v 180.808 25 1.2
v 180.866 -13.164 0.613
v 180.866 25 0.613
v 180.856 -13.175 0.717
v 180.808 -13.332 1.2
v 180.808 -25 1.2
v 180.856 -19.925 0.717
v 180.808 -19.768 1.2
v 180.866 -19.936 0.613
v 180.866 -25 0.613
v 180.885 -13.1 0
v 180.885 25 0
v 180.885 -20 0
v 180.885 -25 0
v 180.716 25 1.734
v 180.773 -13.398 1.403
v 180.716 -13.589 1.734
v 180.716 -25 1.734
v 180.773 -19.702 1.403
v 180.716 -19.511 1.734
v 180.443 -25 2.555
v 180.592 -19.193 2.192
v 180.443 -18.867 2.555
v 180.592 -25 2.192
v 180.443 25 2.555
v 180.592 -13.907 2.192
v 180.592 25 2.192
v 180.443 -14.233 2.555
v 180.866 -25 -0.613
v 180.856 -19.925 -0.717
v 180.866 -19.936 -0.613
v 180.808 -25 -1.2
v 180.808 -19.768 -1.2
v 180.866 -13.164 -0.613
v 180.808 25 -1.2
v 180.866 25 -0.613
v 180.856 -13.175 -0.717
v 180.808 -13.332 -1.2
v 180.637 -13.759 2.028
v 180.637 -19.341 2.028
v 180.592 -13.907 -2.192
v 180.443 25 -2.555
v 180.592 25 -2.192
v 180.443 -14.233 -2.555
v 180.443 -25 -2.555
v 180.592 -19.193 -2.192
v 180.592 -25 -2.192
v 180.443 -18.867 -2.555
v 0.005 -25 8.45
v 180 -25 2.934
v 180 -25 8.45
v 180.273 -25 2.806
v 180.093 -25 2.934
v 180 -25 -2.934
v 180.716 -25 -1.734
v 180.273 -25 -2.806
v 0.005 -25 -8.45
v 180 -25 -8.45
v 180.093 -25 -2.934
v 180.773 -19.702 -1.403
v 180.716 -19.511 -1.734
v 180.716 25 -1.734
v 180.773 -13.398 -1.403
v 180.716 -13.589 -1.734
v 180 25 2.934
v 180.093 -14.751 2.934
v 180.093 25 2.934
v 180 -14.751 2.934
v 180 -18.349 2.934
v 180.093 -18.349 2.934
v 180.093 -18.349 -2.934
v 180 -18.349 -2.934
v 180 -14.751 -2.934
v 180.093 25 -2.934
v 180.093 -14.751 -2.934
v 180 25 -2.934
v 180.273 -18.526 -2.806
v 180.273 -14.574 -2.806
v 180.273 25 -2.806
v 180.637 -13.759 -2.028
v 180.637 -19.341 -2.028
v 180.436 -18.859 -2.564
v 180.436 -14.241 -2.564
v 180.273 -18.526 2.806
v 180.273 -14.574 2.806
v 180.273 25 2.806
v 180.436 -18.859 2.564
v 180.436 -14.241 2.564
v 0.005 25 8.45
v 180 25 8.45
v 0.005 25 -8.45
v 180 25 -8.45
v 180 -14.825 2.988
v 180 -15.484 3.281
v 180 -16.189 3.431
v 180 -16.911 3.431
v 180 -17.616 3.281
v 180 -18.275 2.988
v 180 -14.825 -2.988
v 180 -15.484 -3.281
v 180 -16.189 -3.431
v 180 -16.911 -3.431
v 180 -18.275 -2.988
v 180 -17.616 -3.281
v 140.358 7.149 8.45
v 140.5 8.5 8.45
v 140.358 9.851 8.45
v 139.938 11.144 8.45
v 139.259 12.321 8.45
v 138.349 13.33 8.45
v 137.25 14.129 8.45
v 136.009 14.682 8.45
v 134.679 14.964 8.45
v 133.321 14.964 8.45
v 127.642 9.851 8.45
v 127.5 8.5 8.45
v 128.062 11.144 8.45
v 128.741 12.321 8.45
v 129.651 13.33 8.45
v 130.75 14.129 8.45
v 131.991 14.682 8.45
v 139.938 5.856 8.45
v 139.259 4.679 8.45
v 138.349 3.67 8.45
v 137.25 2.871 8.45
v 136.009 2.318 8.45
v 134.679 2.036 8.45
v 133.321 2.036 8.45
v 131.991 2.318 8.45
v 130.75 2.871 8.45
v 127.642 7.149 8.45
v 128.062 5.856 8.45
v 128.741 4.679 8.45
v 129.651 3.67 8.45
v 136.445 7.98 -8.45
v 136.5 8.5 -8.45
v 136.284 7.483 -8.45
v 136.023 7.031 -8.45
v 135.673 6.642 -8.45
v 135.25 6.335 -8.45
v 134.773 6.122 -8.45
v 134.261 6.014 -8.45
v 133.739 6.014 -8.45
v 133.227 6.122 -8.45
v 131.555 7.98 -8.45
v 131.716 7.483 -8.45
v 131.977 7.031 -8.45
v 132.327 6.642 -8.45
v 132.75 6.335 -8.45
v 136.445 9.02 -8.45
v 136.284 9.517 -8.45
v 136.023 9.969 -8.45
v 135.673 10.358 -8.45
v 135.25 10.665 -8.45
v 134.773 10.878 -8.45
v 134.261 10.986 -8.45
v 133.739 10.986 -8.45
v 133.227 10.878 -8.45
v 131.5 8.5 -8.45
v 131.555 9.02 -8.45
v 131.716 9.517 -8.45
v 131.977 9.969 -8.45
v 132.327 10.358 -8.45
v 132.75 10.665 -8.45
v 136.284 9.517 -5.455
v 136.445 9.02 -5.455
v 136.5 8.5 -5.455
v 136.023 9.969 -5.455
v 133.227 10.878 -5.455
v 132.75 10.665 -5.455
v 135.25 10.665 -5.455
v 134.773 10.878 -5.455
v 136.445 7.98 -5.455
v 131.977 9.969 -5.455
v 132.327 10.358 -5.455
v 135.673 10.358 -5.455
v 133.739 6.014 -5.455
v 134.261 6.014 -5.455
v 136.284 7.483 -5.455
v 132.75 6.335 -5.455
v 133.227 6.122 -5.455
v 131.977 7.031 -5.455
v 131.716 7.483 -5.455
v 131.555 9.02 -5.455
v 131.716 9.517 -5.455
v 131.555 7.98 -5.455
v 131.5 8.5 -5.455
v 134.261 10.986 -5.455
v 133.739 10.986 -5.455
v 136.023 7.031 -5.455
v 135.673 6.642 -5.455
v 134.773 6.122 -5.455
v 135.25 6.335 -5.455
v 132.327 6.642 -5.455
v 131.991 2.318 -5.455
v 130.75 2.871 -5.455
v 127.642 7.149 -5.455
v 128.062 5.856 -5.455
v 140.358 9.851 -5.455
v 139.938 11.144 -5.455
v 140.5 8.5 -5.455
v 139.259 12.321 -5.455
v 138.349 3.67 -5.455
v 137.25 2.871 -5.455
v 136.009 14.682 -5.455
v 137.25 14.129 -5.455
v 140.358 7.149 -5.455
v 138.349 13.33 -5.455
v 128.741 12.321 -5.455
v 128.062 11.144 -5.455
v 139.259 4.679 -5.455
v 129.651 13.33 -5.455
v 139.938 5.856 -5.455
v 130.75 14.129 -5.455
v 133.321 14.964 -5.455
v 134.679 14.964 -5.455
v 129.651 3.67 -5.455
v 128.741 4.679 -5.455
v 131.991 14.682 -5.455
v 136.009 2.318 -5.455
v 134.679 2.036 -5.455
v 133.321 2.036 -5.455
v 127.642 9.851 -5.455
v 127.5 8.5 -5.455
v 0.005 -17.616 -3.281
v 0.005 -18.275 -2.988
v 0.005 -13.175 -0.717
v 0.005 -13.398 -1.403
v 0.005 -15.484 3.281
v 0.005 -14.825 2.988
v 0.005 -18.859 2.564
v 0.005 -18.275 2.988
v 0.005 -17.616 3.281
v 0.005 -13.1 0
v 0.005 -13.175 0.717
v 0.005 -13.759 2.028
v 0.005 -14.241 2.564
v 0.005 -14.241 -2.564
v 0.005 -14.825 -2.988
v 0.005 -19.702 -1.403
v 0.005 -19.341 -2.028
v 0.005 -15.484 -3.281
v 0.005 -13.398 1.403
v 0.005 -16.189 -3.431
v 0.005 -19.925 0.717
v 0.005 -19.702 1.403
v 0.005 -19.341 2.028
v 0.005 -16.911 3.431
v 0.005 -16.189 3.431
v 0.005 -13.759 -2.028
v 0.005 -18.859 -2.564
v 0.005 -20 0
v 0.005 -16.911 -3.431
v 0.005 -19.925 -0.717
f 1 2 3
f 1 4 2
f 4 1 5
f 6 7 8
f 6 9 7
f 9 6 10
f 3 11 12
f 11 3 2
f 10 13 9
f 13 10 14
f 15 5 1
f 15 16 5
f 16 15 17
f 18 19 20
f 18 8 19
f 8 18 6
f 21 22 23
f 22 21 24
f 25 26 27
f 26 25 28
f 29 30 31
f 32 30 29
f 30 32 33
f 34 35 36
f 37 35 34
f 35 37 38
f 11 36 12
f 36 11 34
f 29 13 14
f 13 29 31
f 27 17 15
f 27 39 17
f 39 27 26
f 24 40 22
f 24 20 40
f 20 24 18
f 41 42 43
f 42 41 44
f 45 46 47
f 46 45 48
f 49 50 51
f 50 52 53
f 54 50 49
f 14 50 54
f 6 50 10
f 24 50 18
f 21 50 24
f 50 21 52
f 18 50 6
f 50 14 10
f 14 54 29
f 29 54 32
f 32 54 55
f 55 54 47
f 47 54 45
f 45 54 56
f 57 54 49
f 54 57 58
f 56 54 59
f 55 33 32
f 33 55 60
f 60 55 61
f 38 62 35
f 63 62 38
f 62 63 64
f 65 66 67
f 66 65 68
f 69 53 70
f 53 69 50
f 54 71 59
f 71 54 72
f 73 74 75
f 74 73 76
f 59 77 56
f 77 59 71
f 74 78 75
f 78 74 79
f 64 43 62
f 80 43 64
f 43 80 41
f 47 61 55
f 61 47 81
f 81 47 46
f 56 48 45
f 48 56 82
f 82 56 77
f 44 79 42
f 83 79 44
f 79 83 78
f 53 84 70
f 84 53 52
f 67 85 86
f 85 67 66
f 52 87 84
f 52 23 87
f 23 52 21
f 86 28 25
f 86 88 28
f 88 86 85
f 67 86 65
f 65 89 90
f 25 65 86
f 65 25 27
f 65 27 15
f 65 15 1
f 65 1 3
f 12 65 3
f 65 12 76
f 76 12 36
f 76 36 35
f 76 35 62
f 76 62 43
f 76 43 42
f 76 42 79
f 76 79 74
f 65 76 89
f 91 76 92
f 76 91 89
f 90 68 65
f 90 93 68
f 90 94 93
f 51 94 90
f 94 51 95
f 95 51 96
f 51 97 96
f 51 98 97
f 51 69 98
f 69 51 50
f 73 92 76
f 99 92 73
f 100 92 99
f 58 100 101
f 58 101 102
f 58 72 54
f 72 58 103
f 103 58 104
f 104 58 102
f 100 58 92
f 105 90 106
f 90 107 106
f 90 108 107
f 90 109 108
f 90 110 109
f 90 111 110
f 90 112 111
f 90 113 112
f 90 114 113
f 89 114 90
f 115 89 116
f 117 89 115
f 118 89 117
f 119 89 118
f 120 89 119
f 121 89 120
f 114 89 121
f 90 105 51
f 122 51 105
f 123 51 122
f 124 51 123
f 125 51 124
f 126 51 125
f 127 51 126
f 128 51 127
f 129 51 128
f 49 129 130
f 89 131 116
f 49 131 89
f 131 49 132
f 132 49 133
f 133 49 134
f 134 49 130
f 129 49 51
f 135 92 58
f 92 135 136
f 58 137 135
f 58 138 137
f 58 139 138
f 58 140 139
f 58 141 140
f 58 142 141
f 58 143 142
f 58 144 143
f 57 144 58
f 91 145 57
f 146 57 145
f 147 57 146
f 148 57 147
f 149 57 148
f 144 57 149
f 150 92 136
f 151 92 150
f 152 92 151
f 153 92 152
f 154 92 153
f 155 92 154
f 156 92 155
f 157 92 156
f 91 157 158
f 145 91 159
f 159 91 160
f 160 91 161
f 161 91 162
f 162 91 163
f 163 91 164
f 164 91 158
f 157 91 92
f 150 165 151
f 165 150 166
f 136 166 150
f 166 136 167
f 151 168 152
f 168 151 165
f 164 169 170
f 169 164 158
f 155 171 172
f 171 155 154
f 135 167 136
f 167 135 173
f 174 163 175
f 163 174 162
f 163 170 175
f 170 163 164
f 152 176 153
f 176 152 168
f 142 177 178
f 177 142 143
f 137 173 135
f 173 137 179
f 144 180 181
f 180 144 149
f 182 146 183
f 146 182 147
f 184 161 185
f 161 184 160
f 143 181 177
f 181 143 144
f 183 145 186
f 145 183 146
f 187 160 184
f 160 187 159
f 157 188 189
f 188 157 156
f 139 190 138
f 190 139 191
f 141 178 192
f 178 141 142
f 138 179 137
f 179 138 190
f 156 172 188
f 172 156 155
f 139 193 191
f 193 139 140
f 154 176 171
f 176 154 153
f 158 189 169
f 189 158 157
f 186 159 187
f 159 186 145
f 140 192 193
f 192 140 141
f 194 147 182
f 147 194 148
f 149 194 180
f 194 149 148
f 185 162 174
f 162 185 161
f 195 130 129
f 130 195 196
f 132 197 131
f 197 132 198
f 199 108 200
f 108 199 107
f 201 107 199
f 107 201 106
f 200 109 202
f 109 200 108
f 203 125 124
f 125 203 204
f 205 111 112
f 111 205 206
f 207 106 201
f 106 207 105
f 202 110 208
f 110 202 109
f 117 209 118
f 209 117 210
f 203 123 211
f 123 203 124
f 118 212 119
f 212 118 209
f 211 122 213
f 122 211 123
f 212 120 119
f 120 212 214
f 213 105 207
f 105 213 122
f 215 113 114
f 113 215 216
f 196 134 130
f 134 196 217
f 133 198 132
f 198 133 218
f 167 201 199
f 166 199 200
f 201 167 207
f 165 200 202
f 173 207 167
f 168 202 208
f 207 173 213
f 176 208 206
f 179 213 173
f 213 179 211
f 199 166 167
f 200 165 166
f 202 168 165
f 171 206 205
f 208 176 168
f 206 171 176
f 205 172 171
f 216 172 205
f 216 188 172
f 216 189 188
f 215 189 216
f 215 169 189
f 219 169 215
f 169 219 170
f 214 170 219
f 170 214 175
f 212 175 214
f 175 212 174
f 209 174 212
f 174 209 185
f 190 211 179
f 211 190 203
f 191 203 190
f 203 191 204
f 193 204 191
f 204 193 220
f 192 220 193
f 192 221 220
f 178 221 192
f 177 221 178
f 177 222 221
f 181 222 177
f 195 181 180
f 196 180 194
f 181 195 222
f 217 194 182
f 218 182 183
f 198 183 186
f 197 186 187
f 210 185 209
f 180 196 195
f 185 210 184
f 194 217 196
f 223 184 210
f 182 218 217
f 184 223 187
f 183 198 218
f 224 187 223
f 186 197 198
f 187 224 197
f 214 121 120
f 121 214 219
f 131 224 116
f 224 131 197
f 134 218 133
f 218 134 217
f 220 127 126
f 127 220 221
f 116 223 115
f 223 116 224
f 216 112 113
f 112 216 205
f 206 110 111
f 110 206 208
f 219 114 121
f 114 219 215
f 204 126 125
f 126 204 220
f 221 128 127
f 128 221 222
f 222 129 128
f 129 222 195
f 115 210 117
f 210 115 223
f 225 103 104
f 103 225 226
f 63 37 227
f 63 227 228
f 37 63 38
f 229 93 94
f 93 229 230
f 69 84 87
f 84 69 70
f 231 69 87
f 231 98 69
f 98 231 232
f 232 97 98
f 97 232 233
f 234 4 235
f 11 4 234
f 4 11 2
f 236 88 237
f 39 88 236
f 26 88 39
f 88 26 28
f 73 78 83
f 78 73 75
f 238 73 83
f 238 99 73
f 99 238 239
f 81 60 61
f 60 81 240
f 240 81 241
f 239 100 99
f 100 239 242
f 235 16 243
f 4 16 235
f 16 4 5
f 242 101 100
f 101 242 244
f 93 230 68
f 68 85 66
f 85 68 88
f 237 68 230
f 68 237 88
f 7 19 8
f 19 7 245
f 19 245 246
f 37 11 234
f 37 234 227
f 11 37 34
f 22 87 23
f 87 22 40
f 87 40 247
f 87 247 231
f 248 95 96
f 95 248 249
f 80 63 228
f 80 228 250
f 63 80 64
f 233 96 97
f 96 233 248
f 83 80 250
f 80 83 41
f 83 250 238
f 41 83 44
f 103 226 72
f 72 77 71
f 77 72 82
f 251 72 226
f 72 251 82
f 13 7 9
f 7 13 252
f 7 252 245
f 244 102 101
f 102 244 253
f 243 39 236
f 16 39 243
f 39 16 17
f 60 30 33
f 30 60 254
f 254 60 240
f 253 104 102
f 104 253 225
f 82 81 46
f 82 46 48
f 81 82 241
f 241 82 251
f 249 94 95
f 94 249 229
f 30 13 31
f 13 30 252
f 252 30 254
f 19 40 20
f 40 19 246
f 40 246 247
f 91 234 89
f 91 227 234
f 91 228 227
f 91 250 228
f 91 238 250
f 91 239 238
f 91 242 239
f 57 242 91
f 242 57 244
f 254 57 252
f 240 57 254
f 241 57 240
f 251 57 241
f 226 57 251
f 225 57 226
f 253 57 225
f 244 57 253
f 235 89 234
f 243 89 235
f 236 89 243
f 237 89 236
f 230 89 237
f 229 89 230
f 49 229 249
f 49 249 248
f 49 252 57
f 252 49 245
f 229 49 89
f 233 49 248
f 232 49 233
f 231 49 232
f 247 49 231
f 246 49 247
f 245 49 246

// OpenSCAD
/*
*    Hinge-parts for mounting a video monitor under a shelf.
*
*    Copyright (C) 2021 John Winans
*
*    This program is free software: you can redistribute it and/or modify
*    it under the terms of the GNU General Public License as published by
*    the Free Software Foundation, either version 3 of the License, or
*    (at your option) any later version.
*
*    This program is distributed in the hope that it will be useful,
*    but WITHOUT ANY WARRANTY; without even the implied warranty of
*    MERCHANTABILITY or FITNESS FOR A PARTICULAR PURPOSE.  See the
*    GNU General Public License for more details.
*
*    You should have received a copy of the GNU General Public License
*    along with this program.  If not, see <https://www.gnu.org/licenses/>.
*/



// The following values are suitable for mounting the hinge under
// a shelf with drywall screws.

uni_span=41;    // unistrut cross-section
uni_width=25;   // the width of the mounting block
uni_height=30;  // the thickness of the mounting block
uni_detent_depth=0; // how deep to cut the detent slot to hold monitor rotated up
uni_detent_cyl_scale=.3;    // manage the radius of the detent tongue & groove

//uni_bolt_dia=10;    // suitable for 3/8" bolt (for unistrut)
uni_bolt_dia=5;     // suitable for a drywall screw

rod_hanger_dia=6.9; // suitable for 1/4" threaded rod
rod_hanger_inset=7; // distance from hanger rod to the edge of the block

uni_hexnut_dia=13.5;  // diameter for a hex nut countersink
uni_hexnut_depth=6; // countersink depth for hexnut



// The following values are suitable for mounting a ZSCMALLS Portable 15.6 Inch monitor.
// $129.99 at Amazon on 2020/11  ASIN: B07VFF4TZG
// Remove the monitor from its cover & reuse the same bolts to attach the monitor brackets!

mb_rod_inset=5;
mb_width=360;       // outside width of monitor plus a small gap
mb_height=50;
mb_thick=rod_hanger_dia+2*mb_rod_inset;

mb_mount_bolt_dia=5;    // suitable for M4 bolt
mb_mount_bolt_span=268; // distance between mounting bolts
mb_mount_countersink_depth=mb_thick-3;
mb_mount_countersink_dia=13;
mb_mount_bolt_inset=10;






// Using these direct-calls are useful for debugging with the OpenSCAD GUI.
// Uncomment one of these to print one of the parts of the hinge.

//uniblock();           // left-side mounting block
//uniblock(left=false); // right-side mounting block

//mb_half();            // left-side monitor bracket
//mb_half(left=false);  // right-side monitor bracket
//monitorbracket();       // the whole monitor bracket






/**
* This section is so that you can use the same file to generate 
* each of four parts one at-a-time from a Makefile by defining
* 'make_this' to any of:
*
* 0 = do nothing (use the above function-calls to select what to print)
* 1 = left-side mounting block
* 2 = right-side mounting block
* 3 = left-side monitor mounting bracket
* 4 = right-side monitor mounting bracket
*
* Note that uni_bolt_dia is also able to be overridden from the
* command-line/Makefile.
*
* By default this code will do nothing.
******************************************************************/
make_this=4;				// by default, do nothing

if (make_this==1)
	uniblock();				// left-side mounting block
else if (make_this==2)
	uniblock(left=false);	// right-side mounting block
else if (make_this==3)
	mb_half();				// left-side monitor bracket
else if (make_this==4)
	mb_half(left=false);	// right-side monitor bracket



/**
* A block used to attach one end of the monitor to Unistrut.
******************************************************************/
module uniblock(left=true)
{
    rod_hanger_offset = -uni_height/2+rod_hanger_dia/2+rod_hanger_inset;
    groove_offset = left ? uni_width/2 : -uni_width/2;
    rot = left ? -90 : 90;
    countersink_offset = left ? -uni_width/2 : uni_width/2;
    
    rotate([0,rot,0])   // print with detent up so not need support
    difference()
    {
        cube([uni_width, uni_span, uni_height], center=true);
        // unistrut mounting bolt hole
        cylinder(d=uni_bolt_dia, h=uni_height+.01, center=true, $fn=30);
        
        // hanger bolt hole
        translate([0,-uni_span/2+rod_hanger_dia/2+rod_hanger_inset, rod_hanger_offset])        
            rotate([0,90,0]) cylinder(d=rod_hanger_dia, h=uni_width+.01, center=true, $fn=30);
        
        // A countersink for a n optional hex nut
        translate([countersink_offset,-uni_span/2+rod_hanger_dia/2+rod_hanger_inset, rod_hanger_offset])        
            rotate([0,90,0]) cylinder(d=uni_hexnut_dia, h=uni_hexnut_depth*2, center=true, $fn=6);
        
        // a detent slot to help hold the monitor when pushed back/up
        translate([groove_offset, 0, rod_hanger_offset]) 
        {
            detent_dia=rod_hanger_dia;
            cube([uni_detent_depth, uni_span+.01, rod_hanger_dia], center=true);
            for (x=[uni_detent_depth/2,-uni_detent_depth/2])
            {
                translate([x,0,0]) 
                    rotate([90,0,0]) 
                    scale([uni_detent_cyl_scale,1,1]) 
                    cylinder(d=detent_dia, h=uni_span+.01, center=true, $fn=30);
            }
        }
    }
}

/**
******************************************************************/
module mb_half(left=true)
{
    mask_width=mb_width/2+5;    // extra to eat the tongue as well
    mask_offset=left?mask_width/2:-mask_width/2;
    
    rotate([90,0,0])    // render it ready to print
    difference()
    {
        monitorbracket();
        translate([mask_offset,0,0]) cube([mask_width+.01,mb_thick+.01,mb_height+.01], center=true);
    }
}

/**
******************************************************************/
module monitorbracket()
{
    bolt_length = mb_width+uni_detent_depth*2+3;
    
    difference()
    {
        union()
        {
            cube([mb_width, mb_thick, mb_height], center=true);

            // tongues to mate the groove in the uniblock
            for ( x = [mb_width/2, -mb_width/2] )
            {
                translate([x, 0, 0]) 
                {
                    for ( x=[uni_detent_depth/2, -uni_detent_depth/2])
                    translate([x,0,0]) scale([uni_detent_cyl_scale,1,1]) cylinder(d=rod_hanger_dia-1, h=mb_height, center=true, $fn=30);
                   cube([uni_detent_depth, rod_hanger_dia-1, mb_height], center=true);
                }
            }
        }
        
        // the holes for the threaded rod
        translate([0,0,mb_height/2-rod_hanger_dia/2-mb_rod_inset])
            rotate([0,90,0]) cylinder(d=rod_hanger_dia, h=bolt_length+.01, center=true, $fn=30);
    
        // the holes for the monitor mounting bolts
        for ( x = [-mb_mount_bolt_span/2, mb_mount_bolt_span/2 ])
            translate([x,0,-mb_height/2+mb_mount_countersink_dia/2+mb_mount_bolt_inset])
            {
                rotate([-90,0,0]) 
                {
                    // the mounting bolt hole
                    cylinder(d=mb_mount_bolt_dia, h=mb_thick+.01, center=true, $fn=30);
                    // the countersink bore
                    translate([0,0,mb_thick/2-mb_mount_countersink_depth/2])
                        cylinder(d=mb_mount_countersink_dia, h=mb_mount_countersink_depth+.01, center=true, $fn=30);
                }
            }
        
        for (x = [-mb_width/2+20, -20] )
        // slots for a cable-bundle zip-tie 
        translate([x,-mb_thick/2,-mb_height/2]) 
        {
            // slot on bottom
            cube([10,6,20], center=true);
            // slot on top
            translate([0,mb_thick,0]) cube([10,6,20], center=true);
            // slot through the bracket
            translate([0,mb_thick/2,10]) cube([10,mb_thick+.01,5], center=true);
        }
    }
}
